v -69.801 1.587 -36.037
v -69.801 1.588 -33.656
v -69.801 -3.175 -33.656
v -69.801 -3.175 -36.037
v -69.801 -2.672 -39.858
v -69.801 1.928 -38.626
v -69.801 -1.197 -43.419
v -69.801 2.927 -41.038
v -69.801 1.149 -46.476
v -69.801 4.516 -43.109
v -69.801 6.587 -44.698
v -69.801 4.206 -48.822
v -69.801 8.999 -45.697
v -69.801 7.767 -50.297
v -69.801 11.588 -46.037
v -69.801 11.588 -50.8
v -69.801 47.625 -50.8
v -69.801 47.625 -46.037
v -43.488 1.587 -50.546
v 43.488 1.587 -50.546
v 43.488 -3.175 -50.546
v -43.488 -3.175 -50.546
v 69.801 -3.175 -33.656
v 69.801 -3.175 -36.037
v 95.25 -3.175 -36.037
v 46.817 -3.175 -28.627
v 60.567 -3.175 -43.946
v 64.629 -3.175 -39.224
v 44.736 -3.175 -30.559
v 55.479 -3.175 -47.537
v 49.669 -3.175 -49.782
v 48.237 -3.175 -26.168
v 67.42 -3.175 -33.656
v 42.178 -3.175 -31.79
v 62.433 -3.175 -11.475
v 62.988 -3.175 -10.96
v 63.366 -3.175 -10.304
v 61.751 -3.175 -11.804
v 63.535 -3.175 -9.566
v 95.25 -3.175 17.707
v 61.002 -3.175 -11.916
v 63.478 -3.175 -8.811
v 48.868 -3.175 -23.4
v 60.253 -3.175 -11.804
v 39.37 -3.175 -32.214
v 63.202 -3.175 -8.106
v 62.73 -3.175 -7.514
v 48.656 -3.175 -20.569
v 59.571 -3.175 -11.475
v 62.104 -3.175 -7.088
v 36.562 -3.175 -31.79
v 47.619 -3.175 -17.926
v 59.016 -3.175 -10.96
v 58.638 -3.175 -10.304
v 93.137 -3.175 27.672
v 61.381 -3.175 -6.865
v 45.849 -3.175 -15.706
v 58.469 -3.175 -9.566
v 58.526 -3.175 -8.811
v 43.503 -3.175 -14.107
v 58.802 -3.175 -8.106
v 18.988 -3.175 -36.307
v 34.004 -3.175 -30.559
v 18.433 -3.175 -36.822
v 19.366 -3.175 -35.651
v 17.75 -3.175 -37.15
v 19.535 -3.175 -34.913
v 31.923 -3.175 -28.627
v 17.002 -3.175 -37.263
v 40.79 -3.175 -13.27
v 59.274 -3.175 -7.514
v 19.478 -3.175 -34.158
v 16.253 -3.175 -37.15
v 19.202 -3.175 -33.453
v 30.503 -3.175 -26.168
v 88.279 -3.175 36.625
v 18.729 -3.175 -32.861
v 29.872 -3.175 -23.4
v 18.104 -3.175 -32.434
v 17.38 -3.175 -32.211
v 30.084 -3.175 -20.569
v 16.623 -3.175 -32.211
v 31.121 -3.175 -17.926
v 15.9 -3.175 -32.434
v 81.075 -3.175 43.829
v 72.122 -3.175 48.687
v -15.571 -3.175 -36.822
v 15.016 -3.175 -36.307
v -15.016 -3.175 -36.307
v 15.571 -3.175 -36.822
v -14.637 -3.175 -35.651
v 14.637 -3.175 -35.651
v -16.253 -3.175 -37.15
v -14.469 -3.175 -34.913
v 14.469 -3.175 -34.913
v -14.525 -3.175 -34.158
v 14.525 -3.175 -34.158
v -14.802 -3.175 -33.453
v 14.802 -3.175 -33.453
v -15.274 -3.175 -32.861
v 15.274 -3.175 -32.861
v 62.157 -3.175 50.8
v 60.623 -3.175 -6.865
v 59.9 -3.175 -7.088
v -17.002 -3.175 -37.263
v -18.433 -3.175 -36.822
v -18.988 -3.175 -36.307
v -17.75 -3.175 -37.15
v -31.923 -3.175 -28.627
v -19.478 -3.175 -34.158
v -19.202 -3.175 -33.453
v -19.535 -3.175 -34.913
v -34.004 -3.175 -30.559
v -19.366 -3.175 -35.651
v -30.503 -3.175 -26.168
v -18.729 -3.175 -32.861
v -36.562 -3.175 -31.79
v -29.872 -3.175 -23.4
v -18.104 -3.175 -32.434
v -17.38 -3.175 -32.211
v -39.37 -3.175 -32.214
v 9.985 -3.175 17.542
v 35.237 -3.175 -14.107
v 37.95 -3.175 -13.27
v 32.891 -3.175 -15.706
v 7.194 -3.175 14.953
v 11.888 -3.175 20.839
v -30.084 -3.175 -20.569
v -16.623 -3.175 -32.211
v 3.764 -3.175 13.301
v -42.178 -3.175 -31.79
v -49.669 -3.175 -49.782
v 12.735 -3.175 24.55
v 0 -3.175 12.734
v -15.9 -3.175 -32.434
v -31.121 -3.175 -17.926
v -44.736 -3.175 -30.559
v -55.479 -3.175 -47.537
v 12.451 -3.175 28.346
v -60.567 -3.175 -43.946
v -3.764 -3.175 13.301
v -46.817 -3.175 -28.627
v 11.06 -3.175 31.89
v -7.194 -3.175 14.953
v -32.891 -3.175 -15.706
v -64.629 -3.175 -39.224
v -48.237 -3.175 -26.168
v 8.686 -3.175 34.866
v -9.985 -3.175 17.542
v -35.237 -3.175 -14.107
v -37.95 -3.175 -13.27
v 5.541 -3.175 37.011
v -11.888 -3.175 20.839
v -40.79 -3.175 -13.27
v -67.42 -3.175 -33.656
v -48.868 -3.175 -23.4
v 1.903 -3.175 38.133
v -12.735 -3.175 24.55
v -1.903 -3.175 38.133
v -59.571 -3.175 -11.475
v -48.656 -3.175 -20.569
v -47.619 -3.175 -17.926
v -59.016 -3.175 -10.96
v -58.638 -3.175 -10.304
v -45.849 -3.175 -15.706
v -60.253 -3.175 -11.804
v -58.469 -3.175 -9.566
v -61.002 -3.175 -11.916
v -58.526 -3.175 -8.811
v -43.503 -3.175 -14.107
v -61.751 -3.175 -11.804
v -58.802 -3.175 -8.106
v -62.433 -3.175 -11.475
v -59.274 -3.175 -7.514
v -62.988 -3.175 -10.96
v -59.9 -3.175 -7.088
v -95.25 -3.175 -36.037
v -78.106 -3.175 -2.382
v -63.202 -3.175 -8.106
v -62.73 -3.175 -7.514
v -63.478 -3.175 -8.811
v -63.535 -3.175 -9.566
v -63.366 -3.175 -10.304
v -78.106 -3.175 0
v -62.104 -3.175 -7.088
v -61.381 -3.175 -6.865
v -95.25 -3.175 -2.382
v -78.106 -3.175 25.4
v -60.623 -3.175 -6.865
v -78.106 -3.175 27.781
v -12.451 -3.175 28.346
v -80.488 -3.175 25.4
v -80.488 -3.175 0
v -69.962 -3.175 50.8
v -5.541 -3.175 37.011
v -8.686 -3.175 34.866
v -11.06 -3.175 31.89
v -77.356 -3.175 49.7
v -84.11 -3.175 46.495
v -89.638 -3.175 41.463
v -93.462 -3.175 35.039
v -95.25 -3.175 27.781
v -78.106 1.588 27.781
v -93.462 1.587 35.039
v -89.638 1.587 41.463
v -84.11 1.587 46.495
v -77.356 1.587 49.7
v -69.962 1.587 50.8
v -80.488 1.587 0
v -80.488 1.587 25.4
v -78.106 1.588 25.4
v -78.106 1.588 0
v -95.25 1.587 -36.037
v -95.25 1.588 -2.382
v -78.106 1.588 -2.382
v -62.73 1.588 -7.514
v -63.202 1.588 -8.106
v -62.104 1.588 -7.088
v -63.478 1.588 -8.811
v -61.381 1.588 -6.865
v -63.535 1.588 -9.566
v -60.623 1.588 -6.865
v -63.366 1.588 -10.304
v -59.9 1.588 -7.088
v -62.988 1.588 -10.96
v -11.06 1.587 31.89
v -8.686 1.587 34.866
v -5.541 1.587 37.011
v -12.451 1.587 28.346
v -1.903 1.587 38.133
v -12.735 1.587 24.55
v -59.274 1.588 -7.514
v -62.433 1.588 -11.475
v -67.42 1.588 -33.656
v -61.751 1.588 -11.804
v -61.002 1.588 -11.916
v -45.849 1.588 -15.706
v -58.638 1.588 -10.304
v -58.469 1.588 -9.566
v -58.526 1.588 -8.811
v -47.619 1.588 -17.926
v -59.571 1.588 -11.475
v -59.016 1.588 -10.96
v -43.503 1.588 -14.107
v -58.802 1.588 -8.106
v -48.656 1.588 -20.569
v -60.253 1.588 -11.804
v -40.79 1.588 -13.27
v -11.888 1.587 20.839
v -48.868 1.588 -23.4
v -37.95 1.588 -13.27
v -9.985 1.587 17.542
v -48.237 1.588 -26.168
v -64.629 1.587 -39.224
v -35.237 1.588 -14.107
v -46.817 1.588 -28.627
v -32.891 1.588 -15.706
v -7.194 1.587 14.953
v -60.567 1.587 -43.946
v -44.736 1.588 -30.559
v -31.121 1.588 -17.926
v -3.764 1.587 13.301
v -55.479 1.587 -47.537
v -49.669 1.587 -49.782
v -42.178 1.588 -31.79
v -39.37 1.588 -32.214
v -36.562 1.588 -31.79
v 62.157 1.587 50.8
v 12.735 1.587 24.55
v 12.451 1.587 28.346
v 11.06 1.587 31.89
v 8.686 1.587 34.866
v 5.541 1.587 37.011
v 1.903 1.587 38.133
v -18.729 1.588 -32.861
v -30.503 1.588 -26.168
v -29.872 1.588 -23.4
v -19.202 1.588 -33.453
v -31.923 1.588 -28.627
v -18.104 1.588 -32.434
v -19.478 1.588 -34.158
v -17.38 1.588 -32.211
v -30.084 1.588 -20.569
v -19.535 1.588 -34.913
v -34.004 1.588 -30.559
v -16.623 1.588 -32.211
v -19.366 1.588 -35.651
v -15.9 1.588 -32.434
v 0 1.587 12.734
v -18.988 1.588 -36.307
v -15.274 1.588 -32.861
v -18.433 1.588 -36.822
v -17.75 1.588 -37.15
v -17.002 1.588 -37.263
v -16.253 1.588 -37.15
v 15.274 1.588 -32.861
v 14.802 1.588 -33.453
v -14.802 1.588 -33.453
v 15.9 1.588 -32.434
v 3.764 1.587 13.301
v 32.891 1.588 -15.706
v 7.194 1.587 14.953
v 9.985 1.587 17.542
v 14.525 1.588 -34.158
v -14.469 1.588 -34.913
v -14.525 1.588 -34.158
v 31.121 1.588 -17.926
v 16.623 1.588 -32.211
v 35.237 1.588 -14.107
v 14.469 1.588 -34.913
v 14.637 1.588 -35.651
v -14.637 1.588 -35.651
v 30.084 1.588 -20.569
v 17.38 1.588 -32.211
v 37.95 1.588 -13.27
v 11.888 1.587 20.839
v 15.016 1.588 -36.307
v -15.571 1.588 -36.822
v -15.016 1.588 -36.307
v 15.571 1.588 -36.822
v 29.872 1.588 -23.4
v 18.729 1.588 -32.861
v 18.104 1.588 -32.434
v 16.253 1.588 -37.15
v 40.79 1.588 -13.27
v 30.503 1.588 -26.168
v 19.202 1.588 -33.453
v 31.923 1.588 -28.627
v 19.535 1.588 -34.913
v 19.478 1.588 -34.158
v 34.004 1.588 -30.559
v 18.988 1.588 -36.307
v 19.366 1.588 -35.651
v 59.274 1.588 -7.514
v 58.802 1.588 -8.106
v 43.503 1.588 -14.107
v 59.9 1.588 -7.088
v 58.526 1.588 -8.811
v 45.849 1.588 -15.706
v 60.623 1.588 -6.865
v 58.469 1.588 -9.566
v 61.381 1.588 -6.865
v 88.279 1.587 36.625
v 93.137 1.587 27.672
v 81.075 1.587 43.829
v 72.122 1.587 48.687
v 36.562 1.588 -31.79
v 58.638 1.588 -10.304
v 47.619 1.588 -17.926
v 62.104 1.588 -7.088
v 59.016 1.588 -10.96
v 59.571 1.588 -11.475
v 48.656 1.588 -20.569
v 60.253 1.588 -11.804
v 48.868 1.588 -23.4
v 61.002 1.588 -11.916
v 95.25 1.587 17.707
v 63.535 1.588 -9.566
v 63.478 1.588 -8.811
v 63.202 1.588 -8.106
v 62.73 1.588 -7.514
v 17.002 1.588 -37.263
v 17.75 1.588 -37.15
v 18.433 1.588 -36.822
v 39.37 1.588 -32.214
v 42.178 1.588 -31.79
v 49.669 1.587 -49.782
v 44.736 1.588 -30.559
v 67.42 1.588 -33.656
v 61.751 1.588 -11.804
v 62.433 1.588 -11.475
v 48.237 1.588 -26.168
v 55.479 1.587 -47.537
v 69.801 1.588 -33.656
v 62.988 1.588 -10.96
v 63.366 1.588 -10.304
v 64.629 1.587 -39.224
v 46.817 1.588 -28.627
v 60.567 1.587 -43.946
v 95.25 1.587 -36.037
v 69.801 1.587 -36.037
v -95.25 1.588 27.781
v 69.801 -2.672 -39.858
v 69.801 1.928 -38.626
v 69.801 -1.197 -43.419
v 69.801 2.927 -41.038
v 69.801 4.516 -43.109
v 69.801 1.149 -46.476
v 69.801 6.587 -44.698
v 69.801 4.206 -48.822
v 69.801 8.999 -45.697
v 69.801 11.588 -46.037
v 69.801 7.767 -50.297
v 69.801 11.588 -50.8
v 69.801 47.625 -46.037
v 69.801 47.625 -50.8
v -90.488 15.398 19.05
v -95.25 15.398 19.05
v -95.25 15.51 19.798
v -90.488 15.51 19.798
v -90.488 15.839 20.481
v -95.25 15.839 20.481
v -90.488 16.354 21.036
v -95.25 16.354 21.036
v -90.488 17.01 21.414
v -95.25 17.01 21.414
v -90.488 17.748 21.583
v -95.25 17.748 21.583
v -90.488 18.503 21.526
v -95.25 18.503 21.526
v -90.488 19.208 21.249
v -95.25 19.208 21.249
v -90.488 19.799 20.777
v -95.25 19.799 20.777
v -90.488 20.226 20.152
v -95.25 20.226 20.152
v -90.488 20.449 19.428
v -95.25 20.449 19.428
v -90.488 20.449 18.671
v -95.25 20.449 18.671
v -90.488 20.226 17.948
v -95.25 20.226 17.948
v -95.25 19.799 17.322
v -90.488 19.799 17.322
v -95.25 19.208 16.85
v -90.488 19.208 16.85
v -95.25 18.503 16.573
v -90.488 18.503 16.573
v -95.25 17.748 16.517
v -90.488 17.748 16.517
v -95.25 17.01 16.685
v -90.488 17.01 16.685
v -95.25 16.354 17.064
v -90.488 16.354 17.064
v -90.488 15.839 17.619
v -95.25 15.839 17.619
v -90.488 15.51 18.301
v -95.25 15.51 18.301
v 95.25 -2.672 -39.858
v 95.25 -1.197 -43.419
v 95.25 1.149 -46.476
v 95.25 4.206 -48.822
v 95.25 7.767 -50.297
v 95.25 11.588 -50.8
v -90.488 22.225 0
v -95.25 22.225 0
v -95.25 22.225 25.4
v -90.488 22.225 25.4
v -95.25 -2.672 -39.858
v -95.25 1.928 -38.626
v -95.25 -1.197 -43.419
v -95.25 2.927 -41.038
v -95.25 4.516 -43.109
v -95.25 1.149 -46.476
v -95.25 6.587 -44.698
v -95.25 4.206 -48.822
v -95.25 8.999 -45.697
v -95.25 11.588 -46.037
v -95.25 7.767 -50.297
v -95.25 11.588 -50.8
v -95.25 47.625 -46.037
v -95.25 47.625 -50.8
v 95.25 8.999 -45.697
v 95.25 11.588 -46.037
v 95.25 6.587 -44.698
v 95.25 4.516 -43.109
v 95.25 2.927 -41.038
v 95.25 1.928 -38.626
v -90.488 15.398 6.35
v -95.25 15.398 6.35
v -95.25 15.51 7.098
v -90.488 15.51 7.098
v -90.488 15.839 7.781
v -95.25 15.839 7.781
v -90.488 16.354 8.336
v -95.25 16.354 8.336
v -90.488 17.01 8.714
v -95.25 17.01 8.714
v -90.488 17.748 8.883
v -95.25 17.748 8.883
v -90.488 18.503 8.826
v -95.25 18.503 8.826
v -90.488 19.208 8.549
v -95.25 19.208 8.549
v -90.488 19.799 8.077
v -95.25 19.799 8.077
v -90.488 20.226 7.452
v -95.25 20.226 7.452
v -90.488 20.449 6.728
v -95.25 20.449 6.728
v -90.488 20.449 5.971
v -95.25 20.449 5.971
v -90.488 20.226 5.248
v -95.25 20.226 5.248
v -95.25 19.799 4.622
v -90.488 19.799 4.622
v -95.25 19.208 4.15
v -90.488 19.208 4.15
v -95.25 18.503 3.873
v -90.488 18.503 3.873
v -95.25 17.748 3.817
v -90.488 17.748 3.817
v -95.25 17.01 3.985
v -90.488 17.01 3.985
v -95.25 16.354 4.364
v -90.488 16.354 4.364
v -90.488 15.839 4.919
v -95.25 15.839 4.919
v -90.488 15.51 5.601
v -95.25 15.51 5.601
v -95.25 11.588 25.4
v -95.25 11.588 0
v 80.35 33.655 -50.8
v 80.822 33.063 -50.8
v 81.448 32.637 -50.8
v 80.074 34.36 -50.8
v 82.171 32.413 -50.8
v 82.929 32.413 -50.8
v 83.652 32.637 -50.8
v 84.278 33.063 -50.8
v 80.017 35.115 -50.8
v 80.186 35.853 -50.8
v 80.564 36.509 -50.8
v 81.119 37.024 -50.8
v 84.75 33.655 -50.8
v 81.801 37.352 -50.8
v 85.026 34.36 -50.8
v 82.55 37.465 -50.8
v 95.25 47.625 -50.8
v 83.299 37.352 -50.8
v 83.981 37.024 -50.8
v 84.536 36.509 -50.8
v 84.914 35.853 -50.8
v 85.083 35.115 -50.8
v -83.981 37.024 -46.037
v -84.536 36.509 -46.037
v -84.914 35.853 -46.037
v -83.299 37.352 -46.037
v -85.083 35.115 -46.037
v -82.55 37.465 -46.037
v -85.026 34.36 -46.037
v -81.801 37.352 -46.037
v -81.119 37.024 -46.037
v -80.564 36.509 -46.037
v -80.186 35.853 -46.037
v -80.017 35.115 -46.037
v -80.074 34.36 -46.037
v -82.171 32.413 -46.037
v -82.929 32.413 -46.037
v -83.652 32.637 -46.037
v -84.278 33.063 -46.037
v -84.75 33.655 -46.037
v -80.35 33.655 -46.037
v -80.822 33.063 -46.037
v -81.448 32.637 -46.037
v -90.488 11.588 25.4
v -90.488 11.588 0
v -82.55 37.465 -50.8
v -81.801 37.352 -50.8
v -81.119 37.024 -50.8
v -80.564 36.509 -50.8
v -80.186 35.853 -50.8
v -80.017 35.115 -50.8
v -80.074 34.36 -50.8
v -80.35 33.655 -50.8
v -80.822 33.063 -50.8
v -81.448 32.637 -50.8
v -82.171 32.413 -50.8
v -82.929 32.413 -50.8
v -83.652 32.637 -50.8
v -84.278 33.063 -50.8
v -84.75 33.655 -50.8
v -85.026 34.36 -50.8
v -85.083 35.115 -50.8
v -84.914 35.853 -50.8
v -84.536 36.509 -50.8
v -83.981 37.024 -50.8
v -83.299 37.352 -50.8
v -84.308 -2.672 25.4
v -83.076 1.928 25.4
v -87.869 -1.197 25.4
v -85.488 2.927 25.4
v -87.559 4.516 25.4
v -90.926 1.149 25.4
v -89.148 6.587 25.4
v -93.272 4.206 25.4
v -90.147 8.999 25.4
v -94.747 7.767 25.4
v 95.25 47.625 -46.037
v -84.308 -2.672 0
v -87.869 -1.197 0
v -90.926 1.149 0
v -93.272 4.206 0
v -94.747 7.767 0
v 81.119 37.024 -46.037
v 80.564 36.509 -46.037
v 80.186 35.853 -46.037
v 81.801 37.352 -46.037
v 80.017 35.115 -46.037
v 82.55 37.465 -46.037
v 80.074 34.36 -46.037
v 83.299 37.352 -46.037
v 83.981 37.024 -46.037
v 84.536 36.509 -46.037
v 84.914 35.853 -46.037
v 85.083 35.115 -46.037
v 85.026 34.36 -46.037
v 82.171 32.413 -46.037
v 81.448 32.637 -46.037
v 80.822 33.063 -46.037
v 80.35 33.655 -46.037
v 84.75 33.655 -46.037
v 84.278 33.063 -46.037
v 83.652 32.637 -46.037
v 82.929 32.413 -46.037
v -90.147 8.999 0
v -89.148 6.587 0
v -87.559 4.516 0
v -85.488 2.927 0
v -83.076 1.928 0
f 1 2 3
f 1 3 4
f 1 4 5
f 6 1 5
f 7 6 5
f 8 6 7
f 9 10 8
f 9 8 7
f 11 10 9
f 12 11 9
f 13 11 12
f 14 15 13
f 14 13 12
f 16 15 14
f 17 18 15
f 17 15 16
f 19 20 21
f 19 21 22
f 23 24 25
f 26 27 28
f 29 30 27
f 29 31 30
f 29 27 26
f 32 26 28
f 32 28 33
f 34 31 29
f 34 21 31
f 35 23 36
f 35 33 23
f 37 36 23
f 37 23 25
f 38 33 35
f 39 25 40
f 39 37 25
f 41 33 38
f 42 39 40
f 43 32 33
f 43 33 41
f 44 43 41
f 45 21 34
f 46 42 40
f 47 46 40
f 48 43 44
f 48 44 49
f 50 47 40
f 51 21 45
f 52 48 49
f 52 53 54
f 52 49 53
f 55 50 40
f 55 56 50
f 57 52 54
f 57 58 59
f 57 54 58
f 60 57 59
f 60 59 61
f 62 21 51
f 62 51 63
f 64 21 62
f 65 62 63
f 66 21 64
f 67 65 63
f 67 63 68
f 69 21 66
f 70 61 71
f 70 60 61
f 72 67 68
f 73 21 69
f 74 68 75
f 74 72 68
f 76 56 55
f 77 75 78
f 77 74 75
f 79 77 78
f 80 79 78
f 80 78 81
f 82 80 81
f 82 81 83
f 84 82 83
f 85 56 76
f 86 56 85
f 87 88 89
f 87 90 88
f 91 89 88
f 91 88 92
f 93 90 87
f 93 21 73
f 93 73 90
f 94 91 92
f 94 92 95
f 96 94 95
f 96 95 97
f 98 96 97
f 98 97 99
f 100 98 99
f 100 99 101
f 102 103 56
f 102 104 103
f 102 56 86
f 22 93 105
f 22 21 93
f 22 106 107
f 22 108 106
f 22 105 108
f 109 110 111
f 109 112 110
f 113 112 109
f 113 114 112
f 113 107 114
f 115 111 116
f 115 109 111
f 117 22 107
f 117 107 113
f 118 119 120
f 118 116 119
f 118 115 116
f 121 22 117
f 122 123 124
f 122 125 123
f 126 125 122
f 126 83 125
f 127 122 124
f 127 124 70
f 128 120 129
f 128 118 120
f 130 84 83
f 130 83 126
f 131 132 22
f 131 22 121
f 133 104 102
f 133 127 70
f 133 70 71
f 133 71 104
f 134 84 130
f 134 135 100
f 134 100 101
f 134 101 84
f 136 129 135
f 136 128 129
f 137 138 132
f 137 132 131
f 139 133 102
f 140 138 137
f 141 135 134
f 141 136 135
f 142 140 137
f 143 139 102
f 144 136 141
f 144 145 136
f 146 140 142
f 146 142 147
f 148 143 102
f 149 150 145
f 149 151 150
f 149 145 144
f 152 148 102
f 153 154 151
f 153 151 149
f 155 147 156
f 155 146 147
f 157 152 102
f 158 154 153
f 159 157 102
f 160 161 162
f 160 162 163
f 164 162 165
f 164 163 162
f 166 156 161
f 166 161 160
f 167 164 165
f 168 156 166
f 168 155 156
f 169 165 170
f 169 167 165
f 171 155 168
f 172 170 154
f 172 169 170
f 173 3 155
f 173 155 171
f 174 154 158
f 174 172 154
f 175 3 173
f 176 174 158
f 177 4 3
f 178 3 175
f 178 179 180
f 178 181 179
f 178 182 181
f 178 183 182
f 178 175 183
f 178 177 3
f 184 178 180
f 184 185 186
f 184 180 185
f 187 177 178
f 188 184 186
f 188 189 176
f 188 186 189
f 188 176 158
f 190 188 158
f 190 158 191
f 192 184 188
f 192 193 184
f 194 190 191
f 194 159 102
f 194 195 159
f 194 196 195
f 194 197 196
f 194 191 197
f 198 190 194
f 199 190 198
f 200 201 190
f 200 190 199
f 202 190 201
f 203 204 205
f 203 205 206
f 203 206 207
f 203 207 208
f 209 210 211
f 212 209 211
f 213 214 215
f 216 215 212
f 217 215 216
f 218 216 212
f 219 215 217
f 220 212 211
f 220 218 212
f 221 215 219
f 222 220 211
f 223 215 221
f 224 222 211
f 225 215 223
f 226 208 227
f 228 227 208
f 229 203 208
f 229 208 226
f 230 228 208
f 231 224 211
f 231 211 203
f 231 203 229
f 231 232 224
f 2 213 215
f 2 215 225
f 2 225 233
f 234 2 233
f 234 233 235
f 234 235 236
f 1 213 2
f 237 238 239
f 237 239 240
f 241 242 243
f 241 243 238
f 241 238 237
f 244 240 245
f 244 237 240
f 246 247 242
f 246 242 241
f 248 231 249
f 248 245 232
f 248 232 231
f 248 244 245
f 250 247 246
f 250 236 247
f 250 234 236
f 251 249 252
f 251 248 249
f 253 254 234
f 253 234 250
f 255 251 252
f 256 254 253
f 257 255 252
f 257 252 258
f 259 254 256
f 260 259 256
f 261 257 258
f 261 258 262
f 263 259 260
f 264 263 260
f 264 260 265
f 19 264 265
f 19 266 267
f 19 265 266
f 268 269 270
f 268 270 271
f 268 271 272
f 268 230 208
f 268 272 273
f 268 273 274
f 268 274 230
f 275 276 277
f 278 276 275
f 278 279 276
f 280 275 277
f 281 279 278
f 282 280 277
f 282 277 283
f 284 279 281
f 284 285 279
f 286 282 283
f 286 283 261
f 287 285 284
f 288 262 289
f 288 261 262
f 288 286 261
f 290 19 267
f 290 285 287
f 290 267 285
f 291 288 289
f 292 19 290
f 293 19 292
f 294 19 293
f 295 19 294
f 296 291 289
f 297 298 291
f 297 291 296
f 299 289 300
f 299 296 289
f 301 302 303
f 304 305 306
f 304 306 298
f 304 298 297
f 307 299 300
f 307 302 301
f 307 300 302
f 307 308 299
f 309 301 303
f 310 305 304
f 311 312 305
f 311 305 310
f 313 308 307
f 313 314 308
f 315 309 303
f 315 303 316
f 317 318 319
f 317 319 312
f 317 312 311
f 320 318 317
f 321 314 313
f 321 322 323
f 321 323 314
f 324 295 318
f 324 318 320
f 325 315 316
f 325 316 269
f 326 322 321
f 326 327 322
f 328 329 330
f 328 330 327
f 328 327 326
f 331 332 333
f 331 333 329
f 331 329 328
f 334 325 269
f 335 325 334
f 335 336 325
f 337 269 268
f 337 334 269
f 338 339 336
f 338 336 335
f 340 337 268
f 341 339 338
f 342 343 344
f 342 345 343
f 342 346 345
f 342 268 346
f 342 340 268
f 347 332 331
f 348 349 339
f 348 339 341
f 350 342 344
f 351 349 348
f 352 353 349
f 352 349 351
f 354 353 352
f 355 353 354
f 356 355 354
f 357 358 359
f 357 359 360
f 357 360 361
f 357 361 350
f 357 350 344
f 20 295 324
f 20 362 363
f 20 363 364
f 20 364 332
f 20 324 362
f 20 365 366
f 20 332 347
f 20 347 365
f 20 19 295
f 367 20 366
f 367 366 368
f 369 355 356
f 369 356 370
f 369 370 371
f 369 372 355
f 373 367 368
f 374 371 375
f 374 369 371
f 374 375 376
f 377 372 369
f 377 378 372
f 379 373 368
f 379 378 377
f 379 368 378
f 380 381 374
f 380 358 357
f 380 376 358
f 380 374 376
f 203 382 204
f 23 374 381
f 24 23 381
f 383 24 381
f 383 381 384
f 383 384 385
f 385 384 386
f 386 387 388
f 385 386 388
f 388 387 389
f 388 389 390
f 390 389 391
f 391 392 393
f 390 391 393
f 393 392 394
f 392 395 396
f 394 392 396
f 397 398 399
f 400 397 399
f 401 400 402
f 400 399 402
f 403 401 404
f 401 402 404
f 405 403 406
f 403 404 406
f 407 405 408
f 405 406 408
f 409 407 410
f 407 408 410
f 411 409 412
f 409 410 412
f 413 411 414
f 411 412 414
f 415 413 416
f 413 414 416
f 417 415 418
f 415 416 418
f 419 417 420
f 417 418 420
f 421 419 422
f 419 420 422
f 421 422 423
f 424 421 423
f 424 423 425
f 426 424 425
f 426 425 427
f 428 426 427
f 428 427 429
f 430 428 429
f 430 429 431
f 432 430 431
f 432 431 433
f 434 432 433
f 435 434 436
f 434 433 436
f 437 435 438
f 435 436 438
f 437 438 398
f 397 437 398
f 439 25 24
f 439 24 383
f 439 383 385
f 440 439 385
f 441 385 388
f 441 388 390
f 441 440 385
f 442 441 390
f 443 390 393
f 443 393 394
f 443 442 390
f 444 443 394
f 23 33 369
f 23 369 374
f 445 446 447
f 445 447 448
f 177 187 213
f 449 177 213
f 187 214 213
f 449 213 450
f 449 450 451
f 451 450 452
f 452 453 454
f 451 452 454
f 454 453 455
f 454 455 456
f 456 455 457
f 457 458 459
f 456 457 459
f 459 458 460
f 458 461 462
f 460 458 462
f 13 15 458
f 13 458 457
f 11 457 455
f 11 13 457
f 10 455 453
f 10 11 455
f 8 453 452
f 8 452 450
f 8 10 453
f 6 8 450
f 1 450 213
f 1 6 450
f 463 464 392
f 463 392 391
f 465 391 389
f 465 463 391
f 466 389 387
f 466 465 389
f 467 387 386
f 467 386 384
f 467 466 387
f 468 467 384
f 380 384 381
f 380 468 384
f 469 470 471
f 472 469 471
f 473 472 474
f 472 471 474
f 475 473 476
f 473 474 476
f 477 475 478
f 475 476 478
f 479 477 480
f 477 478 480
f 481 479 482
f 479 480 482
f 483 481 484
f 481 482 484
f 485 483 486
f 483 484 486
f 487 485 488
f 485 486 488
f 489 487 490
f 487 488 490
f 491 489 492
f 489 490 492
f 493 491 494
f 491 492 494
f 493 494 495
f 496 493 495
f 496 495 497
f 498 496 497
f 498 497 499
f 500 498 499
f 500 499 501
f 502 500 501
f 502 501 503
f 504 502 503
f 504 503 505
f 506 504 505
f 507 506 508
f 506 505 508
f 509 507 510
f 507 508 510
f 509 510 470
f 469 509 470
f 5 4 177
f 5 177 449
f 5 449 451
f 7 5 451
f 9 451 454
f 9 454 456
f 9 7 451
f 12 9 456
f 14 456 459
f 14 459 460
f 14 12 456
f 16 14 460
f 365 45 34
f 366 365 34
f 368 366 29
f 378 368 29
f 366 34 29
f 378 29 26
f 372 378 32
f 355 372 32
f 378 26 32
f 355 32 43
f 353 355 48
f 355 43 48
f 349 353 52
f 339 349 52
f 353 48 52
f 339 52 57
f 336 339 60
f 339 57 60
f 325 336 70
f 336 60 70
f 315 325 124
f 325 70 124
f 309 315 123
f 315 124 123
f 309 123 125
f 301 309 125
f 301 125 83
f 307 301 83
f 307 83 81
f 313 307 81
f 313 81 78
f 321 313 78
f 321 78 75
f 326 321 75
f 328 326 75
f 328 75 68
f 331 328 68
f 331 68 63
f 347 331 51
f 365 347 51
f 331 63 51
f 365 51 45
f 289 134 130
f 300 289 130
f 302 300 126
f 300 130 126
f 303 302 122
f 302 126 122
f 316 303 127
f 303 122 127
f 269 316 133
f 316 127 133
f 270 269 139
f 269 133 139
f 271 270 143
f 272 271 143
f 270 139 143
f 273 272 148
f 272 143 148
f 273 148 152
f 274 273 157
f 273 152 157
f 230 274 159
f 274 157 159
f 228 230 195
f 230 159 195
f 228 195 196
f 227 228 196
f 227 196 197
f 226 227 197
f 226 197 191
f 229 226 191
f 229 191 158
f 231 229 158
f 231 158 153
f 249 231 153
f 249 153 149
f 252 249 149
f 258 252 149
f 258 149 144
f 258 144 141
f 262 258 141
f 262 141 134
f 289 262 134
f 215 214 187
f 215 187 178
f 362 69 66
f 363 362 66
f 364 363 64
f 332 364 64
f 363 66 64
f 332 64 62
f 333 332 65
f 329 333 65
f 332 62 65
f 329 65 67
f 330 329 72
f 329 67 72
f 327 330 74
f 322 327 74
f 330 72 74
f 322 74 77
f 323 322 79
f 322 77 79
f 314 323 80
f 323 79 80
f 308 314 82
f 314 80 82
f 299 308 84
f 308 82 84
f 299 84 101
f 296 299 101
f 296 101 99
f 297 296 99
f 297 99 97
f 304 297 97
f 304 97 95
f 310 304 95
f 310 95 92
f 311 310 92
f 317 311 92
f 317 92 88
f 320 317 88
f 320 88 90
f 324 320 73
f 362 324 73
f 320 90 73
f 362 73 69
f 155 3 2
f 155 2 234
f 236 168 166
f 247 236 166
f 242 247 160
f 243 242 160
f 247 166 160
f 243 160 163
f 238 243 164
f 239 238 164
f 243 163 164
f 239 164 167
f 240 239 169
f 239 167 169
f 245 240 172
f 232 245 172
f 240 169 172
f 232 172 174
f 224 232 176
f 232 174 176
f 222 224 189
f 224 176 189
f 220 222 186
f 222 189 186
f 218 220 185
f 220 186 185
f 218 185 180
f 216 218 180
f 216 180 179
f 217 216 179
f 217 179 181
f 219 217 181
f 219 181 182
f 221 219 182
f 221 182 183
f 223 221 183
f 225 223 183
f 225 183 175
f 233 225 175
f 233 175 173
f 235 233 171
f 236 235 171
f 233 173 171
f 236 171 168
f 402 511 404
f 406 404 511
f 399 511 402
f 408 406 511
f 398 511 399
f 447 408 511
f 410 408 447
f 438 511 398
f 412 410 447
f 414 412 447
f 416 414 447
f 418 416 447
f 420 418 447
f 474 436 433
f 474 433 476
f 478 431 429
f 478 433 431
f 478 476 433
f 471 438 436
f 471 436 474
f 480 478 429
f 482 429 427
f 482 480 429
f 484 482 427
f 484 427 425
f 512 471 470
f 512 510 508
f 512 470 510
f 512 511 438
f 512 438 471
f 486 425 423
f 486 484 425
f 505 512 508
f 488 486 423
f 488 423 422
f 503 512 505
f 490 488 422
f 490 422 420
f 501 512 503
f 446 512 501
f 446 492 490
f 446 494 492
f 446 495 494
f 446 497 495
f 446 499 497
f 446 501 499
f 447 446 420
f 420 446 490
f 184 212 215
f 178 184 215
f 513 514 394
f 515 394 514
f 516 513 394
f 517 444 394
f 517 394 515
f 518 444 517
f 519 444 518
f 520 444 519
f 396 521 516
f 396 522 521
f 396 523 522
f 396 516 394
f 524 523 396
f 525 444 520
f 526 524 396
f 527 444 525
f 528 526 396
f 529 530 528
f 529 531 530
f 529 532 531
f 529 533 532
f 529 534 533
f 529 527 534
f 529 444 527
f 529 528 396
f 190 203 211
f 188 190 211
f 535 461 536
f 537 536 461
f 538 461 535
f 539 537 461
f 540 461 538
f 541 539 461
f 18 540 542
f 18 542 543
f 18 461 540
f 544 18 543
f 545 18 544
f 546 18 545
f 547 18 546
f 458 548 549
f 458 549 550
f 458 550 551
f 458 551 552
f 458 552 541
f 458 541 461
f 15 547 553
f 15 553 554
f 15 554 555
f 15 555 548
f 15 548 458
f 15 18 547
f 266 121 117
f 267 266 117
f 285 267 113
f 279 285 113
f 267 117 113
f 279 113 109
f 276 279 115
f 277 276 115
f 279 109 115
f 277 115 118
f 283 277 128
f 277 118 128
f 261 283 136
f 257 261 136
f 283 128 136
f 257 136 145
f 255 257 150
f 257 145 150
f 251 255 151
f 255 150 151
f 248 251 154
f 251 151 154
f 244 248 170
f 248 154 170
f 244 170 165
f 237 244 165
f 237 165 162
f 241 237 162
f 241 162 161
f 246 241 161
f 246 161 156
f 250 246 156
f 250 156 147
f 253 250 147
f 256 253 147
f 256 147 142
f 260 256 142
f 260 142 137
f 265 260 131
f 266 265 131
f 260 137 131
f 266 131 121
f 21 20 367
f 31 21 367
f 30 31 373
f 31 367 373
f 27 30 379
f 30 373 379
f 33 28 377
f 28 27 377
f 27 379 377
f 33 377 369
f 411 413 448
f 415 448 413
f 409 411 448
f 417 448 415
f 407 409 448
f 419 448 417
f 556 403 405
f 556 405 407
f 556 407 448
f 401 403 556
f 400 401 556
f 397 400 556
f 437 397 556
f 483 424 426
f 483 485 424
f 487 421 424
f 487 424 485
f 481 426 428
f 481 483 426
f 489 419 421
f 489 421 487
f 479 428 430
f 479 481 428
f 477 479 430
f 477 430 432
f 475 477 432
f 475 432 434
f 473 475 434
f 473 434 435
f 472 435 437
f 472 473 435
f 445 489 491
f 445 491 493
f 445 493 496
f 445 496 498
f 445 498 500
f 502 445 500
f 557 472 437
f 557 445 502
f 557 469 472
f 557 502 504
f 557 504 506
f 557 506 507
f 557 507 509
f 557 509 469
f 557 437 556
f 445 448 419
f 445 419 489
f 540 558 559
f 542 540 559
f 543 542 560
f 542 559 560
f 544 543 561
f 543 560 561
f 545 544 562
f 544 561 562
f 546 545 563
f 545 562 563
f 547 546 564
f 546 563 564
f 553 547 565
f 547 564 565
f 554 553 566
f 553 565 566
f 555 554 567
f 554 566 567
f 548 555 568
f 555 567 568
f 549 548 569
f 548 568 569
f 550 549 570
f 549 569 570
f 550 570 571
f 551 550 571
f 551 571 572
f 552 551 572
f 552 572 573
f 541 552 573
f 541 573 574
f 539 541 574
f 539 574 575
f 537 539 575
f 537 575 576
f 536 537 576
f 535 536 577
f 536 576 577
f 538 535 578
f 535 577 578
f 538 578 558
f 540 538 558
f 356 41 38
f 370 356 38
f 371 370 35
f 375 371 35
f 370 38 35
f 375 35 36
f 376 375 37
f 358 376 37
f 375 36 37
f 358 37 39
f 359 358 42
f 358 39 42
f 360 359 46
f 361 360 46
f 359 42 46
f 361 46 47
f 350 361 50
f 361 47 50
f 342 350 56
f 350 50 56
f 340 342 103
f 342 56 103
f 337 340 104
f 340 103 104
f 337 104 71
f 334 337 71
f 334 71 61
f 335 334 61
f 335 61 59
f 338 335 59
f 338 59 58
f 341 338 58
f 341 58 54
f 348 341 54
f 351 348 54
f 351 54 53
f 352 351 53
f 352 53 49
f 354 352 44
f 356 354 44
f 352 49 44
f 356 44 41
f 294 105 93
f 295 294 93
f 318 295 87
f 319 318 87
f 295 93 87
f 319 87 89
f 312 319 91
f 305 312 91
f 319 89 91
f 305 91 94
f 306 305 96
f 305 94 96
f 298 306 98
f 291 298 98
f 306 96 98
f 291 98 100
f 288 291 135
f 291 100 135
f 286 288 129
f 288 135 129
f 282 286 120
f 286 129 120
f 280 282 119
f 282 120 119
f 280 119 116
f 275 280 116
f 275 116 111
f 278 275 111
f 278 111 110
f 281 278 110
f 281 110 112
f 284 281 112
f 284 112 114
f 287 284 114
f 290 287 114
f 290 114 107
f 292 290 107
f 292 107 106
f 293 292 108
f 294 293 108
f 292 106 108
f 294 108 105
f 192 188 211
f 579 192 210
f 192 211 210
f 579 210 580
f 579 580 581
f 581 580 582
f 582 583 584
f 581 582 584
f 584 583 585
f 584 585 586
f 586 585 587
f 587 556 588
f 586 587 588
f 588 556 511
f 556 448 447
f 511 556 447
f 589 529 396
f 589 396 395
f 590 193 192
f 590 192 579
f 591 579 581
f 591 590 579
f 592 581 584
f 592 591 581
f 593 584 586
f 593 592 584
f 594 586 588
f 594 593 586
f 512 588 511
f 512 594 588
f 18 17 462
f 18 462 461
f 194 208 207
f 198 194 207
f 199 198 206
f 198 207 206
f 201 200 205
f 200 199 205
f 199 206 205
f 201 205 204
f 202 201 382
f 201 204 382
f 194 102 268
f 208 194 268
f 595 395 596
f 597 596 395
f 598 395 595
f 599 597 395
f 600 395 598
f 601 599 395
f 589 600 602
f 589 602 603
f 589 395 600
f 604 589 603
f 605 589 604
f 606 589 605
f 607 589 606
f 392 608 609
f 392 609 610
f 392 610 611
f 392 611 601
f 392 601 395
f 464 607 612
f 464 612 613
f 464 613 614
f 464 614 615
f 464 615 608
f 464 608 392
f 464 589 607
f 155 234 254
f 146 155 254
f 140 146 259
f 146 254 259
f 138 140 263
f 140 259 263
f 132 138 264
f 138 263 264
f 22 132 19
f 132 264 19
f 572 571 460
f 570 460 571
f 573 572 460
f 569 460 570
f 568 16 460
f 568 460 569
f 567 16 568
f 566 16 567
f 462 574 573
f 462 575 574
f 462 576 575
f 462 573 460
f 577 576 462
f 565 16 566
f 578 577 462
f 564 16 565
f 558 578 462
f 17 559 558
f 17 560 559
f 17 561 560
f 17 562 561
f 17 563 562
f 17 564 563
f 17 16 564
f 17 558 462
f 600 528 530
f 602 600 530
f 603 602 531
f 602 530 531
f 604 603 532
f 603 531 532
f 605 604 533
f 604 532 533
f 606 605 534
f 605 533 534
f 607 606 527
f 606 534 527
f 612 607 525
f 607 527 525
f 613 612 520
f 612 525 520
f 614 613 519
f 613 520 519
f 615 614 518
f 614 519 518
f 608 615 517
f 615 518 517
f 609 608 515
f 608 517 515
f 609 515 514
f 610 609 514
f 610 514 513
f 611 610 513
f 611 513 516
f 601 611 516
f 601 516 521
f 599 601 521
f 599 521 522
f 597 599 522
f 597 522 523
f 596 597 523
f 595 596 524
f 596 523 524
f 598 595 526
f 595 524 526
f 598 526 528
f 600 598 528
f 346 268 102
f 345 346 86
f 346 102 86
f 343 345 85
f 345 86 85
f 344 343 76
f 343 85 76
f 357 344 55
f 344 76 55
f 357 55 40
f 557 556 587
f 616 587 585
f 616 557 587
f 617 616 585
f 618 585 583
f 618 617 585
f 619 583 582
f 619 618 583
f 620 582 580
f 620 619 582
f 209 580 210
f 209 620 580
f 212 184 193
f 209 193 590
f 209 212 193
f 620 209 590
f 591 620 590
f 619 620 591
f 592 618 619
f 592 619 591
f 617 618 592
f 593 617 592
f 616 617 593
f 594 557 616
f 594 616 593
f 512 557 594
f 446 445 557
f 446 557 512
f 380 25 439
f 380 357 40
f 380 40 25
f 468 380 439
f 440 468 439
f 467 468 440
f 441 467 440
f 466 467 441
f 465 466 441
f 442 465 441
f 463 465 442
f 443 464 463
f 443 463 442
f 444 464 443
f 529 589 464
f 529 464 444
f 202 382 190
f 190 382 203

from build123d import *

# Parameters (mm, degrees)
SKETCH1_W                     = 190.5
SKETCH1_H                     = 101.6
BOSS_EXTRUDE1_DEPTH           = 1.5875
CONVERT_SOLID1_START          = -95.25
CONVERT_SOLID1_OUTLINE_W      = 3.175
CONVERT_SOLID1_OUTLINE_H      = 101.6
CONVERT_SOLID1_DEPTH          = 190.5
SKETCH30_R                    = 12.770921212
CUT_EXTRUDE6_DEPTH            = 38.1
SKETCH35_W                    = 139.601875342
SKETCH35_H                    = 6.35
CUT_EXTRUDE7_DEPTH            = 0.254
EDGE_FLANGE1_STRIP_W          = 39.05
EDGE_FLANGE1_STRIP_H          = 4.7625
EDGE_FLANGE1_STRIP_CUT_DEPTH  = 25.449062329
EDGE_FLANGE1_RELIEF_W         = 41.43125
EDGE_FLANGE1_RELIEF_H         = 2.38125
EDGE_FLANGE1_RELIEF_CUT_DEPTH = 4.7625
EDGE_FLANGE1_DEPTH            = 25.449062329
EDGE_FLANGE2_STRIP_W          = 39.05
EDGE_FLANGE2_STRIP_H          = 4.7625
EDGE_FLANGE2_STRIP_CUT_DEPTH  = 25.449062329
EDGE_FLANGE2_RELIEF_W         = 41.43125
EDGE_FLANGE2_RELIEF_H         = 2.38125
EDGE_FLANGE2_RELIEF_CUT_DEPTH = 4.7625
EDGE_FLANGE2_DEPTH            = 25.449062329
SKETCH45_W                    = 4.7625
SKETCH45_H                    = 0.000254
CUT_EXTRUDE10_DEPTH           = 25.4
EDGE_FLANGE4_STRIP_W          = 39.05
EDGE_FLANGE4_STRIP_H          = 4.7625
EDGE_FLANGE4_STRIP_CUT_DEPTH  = 25.4
EDGE_FLANGE4_RELIEF_W         = 41.43125
EDGE_FLANGE4_RELIEF_H         = 2.38125
EDGE_FLANGE4_RELIEF_CUT_DEPTH = 4.7625
EDGE_FLANGE4_DEPTH            = 25.4
FILLET9_R                     = 25.4
CUT_EXTRUDE11_DEPTH           = 25.4
FILLET10_R                    = 25.4
SKETCH53_R                    = 2.54
CUT_EXTRUDE12_DEPTH           = 4.7625
SKETCH54_R                    = 2.54
CUT_EXTRUDE13_DEPTH           = 4.7625
SKETCH55_R                    = 9.525
SKETCH55_R_2                  = 2.54
CUT_EXTRUDE14_DEPTH           = 4.7625


# Read off the part's stored shape, not the designer's step: Convert-Solid1
# Sheet-metal steps are written as plain solids
with BuildPart() as part:
    # Sketch1 → Boss-Extrude1 (new body)
    with BuildSketch(Plane(origin=(0, 0, 0), x_dir=(1, 0, 0), z_dir=(0, 1, 0))):
        Rectangle(SKETCH1_W, SKETCH1_H)
    extrude(amount=BOSS_EXTRUDE1_DEPTH)

    # Convert-Solid1 outline → Convert-Solid1 (add)
    with BuildSketch(Plane.YZ.offset(CONVERT_SOLID1_START)):
        with Locations((-1.5875, 0)):
            Rectangle(CONVERT_SOLID1_OUTLINE_W, CONVERT_SOLID1_OUTLINE_H)
    extrude(amount=CONVERT_SOLID1_DEPTH)

    # Sketch30 → Cut-Extrude6 (cut)
    with BuildSketch(Plane(origin=(0, -3.175, 0), x_dir=(-1, 0, 0), z_dir=(0, -1, 0))):
        with Locations(Location((0, -25.504506424, 0), (0, 0, 90))):
            Circle(SKETCH30_R)
    extrude(amount=-CUT_EXTRUDE6_DEPTH, mode=Mode.SUBTRACT)

    # Sketch35 → Cut-Extrude7 (cut)
    with BuildSketch(Plane(origin=(0, 0, -50.8), x_dir=(-1, 0, 0), z_dir=(0, 0, -1))):
        Rectangle(SKETCH35_W, SKETCH35_H)
    extrude(amount=-CUT_EXTRUDE7_DEPTH, mode=Mode.SUBTRACT)

    # Edge-Flange1 strip (across the edge) → Edge-Flange1 strip cut (cut)
    with BuildSketch(Plane(origin=(95.25, 1.5875, -50.8), x_dir=(0, 0, 1), z_dir=(-1, 0, 0))):
        with Locations((-4.7625, -2.38125)):
            Rectangle(EDGE_FLANGE1_STRIP_W, EDGE_FLANGE1_STRIP_H)
    extrude(amount=EDGE_FLANGE1_STRIP_CUT_DEPTH, mode=Mode.SUBTRACT)

    # Edge-Flange1 relief (on the sheet) → Edge-Flange1 relief cut (cut)
    with BuildSketch(Plane(origin=(95.25, 1.5875, -36.0375), x_dir=(0, 0, 1), z_dir=(0, 1, 0))):
        with Locations((-18.334375, -26.639687329)):
            Rectangle(EDGE_FLANGE1_RELIEF_W, EDGE_FLANGE1_RELIEF_H)
    extrude(amount=-EDGE_FLANGE1_RELIEF_CUT_DEPTH, mode=Mode.SUBTRACT)

    # Edge-Flange1 section (across the edge) → Edge-Flange1 (add)
    with BuildSketch(Plane(origin=(95.25, 1.5875, -50.8), x_dir=(0, 0, 1), z_dir=(-1, 0, 0))):
        with BuildLine():
            Line((0, 10), (0, 46.0375))
            Line((0, 46.0375), (4.7625, 46.0375))
            Line((4.7625, 46.0375), (4.7625, 10))
            ThreePointArc((4.7625, 10), (7.691432188, 2.928932188), (14.7625, 0))
            Line((14.7625, 0), (14.7625, -4.7625))
            ThreePointArc((14.7625, -4.7625), (4.323836143, -0.438663857), (0, 10))
        make_face()
    extrude(amount=EDGE_FLANGE1_DEPTH)

    # Edge-Flange2 strip (across the edge) → Edge-Flange2 strip cut (cut)
    with BuildSketch(Plane(origin=(-69.800937671, 1.5875, -50.8), x_dir=(0, 0, 1), z_dir=(-1, 0, 0))):
        with Locations((-4.7625, -2.38125)):
            Rectangle(EDGE_FLANGE2_STRIP_W, EDGE_FLANGE2_STRIP_H)
    extrude(amount=EDGE_FLANGE2_STRIP_CUT_DEPTH, mode=Mode.SUBTRACT)

    # Edge-Flange2 relief (on the sheet) → Edge-Flange2 relief cut (cut)
    with BuildSketch(Plane(origin=(-69.800937671, 1.5875, -36.0375), x_dir=(0, 0, 1), z_dir=(0, 1, 0))):
        with Locations((-18.334375, 1.190625)):
            Rectangle(EDGE_FLANGE2_RELIEF_W, EDGE_FLANGE2_RELIEF_H)
    extrude(amount=-EDGE_FLANGE2_RELIEF_CUT_DEPTH, mode=Mode.SUBTRACT)

    # Edge-Flange2 section (across the edge) → Edge-Flange2 (add)
    with BuildSketch(Plane(origin=(-69.800937671, 1.5875, -50.8), x_dir=(0, 0, 1), z_dir=(-1, 0, 0))):
        with BuildLine():
            Line((0, 10), (0, 46.0375))
            Line((0, 46.0375), (4.7625, 46.0375))
            Line((4.7625, 46.0375), (4.7625, 10))
            ThreePointArc((4.7625, 10), (7.691432188, 2.928932188), (14.7625, 0))
            Line((14.7625, 0), (14.7625, -4.7625))
            ThreePointArc((14.7625, -4.7625), (4.323836143, -0.438663857), (0, 10))
        make_face()
    extrude(amount=EDGE_FLANGE2_DEPTH)

    # Sketch45 → Cut-Extrude10 (cut)
    with BuildSketch(Plane(origin=(0, 1.5875, 0), x_dir=(1, 0, 0), z_dir=(0, 1, 0))):
        with Locations((-92.86875, -25.399873)):
            Rectangle(SKETCH45_W, SKETCH45_H)
        with Locations((-92.86875, 0.000381)):
            Rectangle(SKETCH45_W, SKETCH45_H)
    extrude(amount=-CUT_EXTRUDE10_DEPTH, mode=Mode.SUBTRACT)

    # Edge-Flange4 strip (across the edge) → Edge-Flange4 strip cut (cut)
    with BuildSketch(Plane(origin=(-95.25, 1.5875, -0.000254), x_dir=(1, 0, 0), z_dir=(0, 0, 1))):
        with Locations((-4.7625, -2.38125)):
            Rectangle(EDGE_FLANGE4_STRIP_W, EDGE_FLANGE4_STRIP_H)
    extrude(amount=EDGE_FLANGE4_STRIP_CUT_DEPTH, mode=Mode.SUBTRACT)

    # Edge-Flange4 relief (on the sheet) → Edge-Flange4 relief cut (cut)
    with BuildSketch(Plane(origin=(-80.4875, 1.5875, -0.000254), x_dir=(1, 0, 0), z_dir=(0, 1, 0))):
        with Locations((-18.334375, 1.190625)):
            Rectangle(EDGE_FLANGE4_RELIEF_W, EDGE_FLANGE4_RELIEF_H)
        with Locations((-18.334375, -26.590625)):
            Rectangle(EDGE_FLANGE4_RELIEF_W, EDGE_FLANGE4_RELIEF_H)
    extrude(amount=-EDGE_FLANGE4_RELIEF_CUT_DEPTH, mode=Mode.SUBTRACT)

    # Edge-Flange4 section (across the edge) → Edge-Flange4 (add)
    with BuildSketch(Plane(origin=(-95.25, 1.5875, -0.000254), x_dir=(1, 0, 0), z_dir=(0, 0, 1))):
        with BuildLine():
            Line((0, 10), (0, 20.6375))
            Line((0, 20.6375), (4.7625, 20.6375))
            Line((4.7625, 20.6375), (4.7625, 10))
            ThreePointArc((4.7625, 10), (7.691432188, 2.928932188), (14.7625, 0))
            Line((14.7625, 0), (14.7625, -4.7625))
            ThreePointArc((14.7625, -4.7625), (4.323836143, -0.438663857), (0, 10))
        make_face()
    extrude(amount=EDGE_FLANGE4_DEPTH)

    # Fillet9
    # the kernel refuses this fillet: 25.4 mm, written as the material it takes off along each edge
    with BuildSketch(Plane(origin=(-67.419687671, 61.417239936, -50.546), x_dir=(1, 0, 0), z_dir=(0, -1, 0))) as fillet9_piece_1:
        with BuildLine():
            CenterArc((23.931895975, 25.4), FILLET9_R, 199.575530564, 70.424469436)
            Line((0, 16.88975), (-0.478637919, 16.719545))
            ThreePointArc((-0.478637919, 16.719545), (-0.508, 8.444875), (-0.508, 0))
            Line((-0.508, 0), (0, -0.508))
            Line((0, -0.508), (23.931895975, -0.508))
            Line((23.931895975, -0.508), (23.931895975, 0))
        make_face()
    extrude(amount=124.421979873, mode=Mode.SUBTRACT)
    with BuildSketch(Plane(origin=(67.419687671, 61.417239936, -50.546), x_dir=(0, 0, 1), z_dir=(0, -1, 0))) as fillet9_piece_2:
        with BuildLine():
            CenterArc((25.4, 23.931895975), FILLET9_R, 180, 70.424469436)
            Line((0, 23.931895975), (-0.508, 23.931895975))
            Line((-0.508, 23.931895975), (-0.508, 0))
            Line((-0.508, 0), (0, -0.508))
            ThreePointArc((0, -0.508), (8.444875, -0.508), (16.719545, -0.478637919))
            Line((16.719545, -0.478637919), (16.88975, 0))
        make_face()
    extrude(amount=124.421979873, mode=Mode.SUBTRACT)

    # Sketch52 → Cut-Extrude11 (cut)
    with BuildSketch(Plane.XZ.offset(3.175)):
        with BuildLine():
            ThreePointArc((62.156767956, 50.8), (84.936935051, 40.486935051), (95.25, 17.706767956))
            Line((95.25, 17.706767956), (95.25, 50.8))
            Line((95.25, 50.8), (62.156767956, 50.8))
        make_face()
    extrude(amount=-CUT_EXTRUDE11_DEPTH, mode=Mode.SUBTRACT)

    # Fillet10
    # the kernel refuses this fillet: 25.4 mm, written as the material it takes off along each edge
    with BuildSketch(Plane(origin=(-95.25, 64.807891195, 50.8), x_dir=(1, 0, 0), z_dir=(0, -1, 0))) as fillet10_piece_1:
        with BuildLine():
            CenterArc((25.288156478, -25.4), FILLET10_R, 90, 84.621196501)
            Line((0, -23.019004), (-0.50576313, -22.97138408))
            ThreePointArc((-0.50576313, -22.97138408), (-0.508, -11.509502), (-0.508, 0))
            Line((-0.508, 0), (0, 0.508))
            Line((0, 0.508), (25.288156478, 0.508))
            Line((25.288156478, 0.508), (25.288156478, 0))
        make_face()
    extrude(amount=131.203282389, mode=Mode.SUBTRACT)

    # Sketch53 → Cut-Extrude12 (cut)
    with BuildSketch(Plane.ZY.offset(95.25)):
        with Locations(Location((6.349746, 17.9375, 0), (0, 0, 270))):
            Circle(SKETCH53_R)
        with Locations(Location((19.049746, 17.9375, 0), (0, 0, 270))):
            Circle(SKETCH53_R)
    extrude(amount=-CUT_EXTRUDE12_DEPTH, mode=Mode.SUBTRACT)

    # Sketch54 → Cut-Extrude13 (cut)
    with BuildSketch(Plane(origin=(0, 0, -50.8), x_dir=(-1, 0, 0), z_dir=(0, 0, -1))):
        with Locations(Location((-82.55, 34.925, 0), (0, 0, 90))):
            Circle(SKETCH54_R)
        with Locations(Location((82.55, 34.925, 0), (0, 0, 90))):
            Circle(SKETCH54_R)
    extrude(amount=-CUT_EXTRUDE13_DEPTH, mode=Mode.SUBTRACT)

    # Sketch55 → Cut-Extrude14 (cut)
    with BuildSketch(Plane.XZ.offset(3.175)):
        with Locations(Location((-39.37, -22.688605117, 0), (0, 0, 270))):
            Circle(SKETCH55_R)
        with Locations(Location((39.37, -22.688605117, 0), (0, 0, 270))):
            Circle(SKETCH55_R)
        with Locations(Location((-17.001810213, -34.722893033, 0), (0, 0, 270))):
            Circle(SKETCH55_R_2)
        with Locations(Location((-61.002047674, -9.376410953, 0), (0, 0, 270))):
            Circle(SKETCH55_R_2)
        with Locations(Location((61.002047674, -9.376410953, 0), (0, 0, 270))):
            Circle(SKETCH55_R_2)
        with Locations(Location((17.001810213, -34.722893033, 0), (0, 0, 270))):
            Circle(SKETCH55_R_2)
    extrude(amount=-CUT_EXTRUDE14_DEPTH, mode=Mode.SUBTRACT)


solid = part.part
